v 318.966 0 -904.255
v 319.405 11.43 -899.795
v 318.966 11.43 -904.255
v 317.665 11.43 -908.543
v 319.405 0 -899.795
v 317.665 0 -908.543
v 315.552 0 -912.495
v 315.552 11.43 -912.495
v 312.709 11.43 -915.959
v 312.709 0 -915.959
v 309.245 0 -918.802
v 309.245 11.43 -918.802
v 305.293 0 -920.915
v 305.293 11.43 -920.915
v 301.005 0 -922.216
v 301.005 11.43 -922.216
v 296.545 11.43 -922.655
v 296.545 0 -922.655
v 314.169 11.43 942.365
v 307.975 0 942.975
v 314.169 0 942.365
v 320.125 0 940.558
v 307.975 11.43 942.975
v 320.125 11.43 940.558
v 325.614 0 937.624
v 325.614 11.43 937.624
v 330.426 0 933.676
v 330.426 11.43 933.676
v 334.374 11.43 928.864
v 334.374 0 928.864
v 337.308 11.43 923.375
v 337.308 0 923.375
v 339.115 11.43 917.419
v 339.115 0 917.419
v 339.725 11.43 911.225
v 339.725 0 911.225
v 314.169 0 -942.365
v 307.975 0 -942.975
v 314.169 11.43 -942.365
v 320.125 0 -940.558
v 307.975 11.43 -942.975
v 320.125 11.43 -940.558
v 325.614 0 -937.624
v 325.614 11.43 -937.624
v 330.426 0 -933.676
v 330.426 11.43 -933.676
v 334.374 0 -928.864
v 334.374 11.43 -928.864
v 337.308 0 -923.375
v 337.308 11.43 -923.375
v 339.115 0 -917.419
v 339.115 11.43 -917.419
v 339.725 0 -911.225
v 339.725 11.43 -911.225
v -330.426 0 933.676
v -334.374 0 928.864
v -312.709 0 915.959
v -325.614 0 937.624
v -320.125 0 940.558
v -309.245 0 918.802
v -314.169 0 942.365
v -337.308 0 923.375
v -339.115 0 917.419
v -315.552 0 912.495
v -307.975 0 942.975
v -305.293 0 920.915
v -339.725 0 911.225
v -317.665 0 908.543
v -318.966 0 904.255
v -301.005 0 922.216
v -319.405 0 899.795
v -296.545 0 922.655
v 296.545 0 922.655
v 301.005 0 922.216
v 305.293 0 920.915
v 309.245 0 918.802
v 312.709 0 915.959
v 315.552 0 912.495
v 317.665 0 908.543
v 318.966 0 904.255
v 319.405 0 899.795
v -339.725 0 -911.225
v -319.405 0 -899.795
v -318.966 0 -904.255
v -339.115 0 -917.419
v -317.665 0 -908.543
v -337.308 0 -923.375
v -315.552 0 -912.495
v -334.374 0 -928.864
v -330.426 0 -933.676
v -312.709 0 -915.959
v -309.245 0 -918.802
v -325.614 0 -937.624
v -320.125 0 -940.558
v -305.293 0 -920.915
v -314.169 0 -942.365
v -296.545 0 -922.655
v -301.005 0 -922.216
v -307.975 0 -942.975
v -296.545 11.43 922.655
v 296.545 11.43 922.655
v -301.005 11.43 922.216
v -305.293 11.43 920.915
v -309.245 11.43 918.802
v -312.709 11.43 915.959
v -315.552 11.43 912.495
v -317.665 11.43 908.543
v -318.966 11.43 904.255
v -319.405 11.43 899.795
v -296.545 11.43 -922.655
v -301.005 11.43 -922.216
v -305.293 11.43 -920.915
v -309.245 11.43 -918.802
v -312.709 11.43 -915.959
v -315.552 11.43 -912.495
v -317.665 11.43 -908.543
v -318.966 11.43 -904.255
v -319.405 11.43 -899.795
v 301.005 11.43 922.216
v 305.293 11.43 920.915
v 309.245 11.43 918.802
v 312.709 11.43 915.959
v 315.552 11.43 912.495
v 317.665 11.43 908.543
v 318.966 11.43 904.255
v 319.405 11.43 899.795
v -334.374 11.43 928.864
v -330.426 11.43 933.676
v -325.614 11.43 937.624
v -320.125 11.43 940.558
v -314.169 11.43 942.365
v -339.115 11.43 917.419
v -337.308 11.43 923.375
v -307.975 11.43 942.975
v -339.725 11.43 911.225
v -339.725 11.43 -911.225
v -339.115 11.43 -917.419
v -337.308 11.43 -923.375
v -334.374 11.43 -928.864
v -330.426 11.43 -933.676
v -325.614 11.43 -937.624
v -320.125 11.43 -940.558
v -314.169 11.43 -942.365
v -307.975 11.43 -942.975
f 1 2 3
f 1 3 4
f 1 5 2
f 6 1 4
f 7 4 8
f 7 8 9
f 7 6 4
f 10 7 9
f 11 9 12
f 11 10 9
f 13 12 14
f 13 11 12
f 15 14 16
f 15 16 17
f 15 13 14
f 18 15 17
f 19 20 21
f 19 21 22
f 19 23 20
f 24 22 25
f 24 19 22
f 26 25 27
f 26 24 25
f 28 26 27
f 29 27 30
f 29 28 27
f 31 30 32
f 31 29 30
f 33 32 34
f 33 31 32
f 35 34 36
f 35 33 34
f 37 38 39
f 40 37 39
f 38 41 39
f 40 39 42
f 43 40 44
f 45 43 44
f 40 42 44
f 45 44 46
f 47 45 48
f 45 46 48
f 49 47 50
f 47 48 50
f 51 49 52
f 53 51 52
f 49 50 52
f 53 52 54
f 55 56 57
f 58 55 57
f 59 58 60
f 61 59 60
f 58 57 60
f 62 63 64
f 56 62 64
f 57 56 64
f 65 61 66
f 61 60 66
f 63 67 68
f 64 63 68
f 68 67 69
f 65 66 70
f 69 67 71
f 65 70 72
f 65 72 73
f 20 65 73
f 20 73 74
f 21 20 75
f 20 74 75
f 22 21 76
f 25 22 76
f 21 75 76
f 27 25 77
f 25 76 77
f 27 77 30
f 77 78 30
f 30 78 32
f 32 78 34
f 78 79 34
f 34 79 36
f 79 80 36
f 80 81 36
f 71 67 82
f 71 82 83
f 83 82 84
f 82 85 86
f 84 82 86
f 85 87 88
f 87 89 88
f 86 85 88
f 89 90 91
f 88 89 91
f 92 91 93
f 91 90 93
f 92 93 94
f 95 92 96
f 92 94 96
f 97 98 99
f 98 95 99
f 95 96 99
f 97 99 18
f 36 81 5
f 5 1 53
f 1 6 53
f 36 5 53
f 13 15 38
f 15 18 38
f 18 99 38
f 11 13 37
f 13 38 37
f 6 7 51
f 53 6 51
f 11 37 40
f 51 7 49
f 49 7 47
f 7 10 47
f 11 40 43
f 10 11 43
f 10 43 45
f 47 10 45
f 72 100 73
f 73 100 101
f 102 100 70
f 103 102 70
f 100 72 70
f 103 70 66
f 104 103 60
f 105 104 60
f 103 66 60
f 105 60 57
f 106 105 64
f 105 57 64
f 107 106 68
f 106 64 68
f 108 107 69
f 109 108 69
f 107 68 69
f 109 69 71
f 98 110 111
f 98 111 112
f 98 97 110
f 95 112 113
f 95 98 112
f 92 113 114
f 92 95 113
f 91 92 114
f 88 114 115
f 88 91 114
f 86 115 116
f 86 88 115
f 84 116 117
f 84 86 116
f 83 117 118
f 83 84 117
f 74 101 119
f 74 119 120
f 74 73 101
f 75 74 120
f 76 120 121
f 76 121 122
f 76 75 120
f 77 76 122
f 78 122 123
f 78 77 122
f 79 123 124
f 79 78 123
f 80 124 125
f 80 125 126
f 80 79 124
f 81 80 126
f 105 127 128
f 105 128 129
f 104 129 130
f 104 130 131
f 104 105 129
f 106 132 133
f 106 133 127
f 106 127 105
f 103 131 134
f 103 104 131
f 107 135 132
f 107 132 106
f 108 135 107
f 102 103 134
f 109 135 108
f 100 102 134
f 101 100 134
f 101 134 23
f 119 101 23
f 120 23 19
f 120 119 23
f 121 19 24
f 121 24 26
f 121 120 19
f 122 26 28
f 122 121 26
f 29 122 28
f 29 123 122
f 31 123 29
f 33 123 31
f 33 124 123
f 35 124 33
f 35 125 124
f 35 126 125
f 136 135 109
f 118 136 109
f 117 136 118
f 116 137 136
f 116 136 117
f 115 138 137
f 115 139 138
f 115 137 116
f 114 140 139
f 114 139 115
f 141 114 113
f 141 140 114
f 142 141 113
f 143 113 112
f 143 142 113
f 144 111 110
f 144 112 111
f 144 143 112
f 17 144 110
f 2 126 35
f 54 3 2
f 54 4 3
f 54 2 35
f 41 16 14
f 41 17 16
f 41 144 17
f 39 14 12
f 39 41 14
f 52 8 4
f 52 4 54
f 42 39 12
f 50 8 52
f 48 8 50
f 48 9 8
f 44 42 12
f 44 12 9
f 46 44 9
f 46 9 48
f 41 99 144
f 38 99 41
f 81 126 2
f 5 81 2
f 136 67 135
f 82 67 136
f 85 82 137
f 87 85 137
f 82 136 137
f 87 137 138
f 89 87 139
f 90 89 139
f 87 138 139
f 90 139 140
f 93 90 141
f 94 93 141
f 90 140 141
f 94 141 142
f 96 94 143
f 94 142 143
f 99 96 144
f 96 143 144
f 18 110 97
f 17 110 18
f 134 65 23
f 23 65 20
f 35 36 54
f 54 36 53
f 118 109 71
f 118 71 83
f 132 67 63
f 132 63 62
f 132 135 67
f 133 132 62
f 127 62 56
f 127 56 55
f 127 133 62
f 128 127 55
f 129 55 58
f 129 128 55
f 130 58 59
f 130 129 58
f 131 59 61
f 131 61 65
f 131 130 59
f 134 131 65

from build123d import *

# Parameters (mm, degrees)
SKETCH1_W           = 679.45
SKETCH1_H           = 1885.95
BOSS_EXTRUDE1_DEPTH = 11.43
SKETCH3_W           = 638.81
SKETCH3_H           = 1845.31
CUT_EXTRUDE2_DEPTH  = 1003.369977179
FILLET1_R           = 31.75
FILLET2_R           = 22.86


with BuildPart() as part:
    # Sketch1 → Boss-Extrude1 (new body)
    with BuildSketch(Plane(origin=(0, 0, 0), x_dir=(1, 0, 0), z_dir=(0, 1, 0))):
        Rectangle(SKETCH1_W, SKETCH1_H)
    extrude(amount=BOSS_EXTRUDE1_DEPTH)

    # Sketch3 → Cut-Extrude2 (cut, through all)
    with BuildSketch(Plane(origin=(0, 11.43, 0), x_dir=(1, 0, 0), z_dir=(0, 1, 0))):
        Rectangle(SKETCH3_W, SKETCH3_H)
    extrude(amount=-CUT_EXTRUDE2_DEPTH, mode=Mode.SUBTRACT)

    # Fillet1
    fillet1_edges = [part.edges().sort_by_distance(p)[0] for p in [
        (-339.725, 5.715, -942.975),
        (339.725, 5.715, -942.975),
        (339.725, 5.715, 942.975),
        (-339.725, 5.715, 942.975),
    ]]
    fillet(fillet1_edges, radius=FILLET1_R)

    # Fillet2
    fillet2_edges = [part.edges().sort_by_distance(p)[0] for p in [
        (-319.405, 5.715, -922.655),
        (319.405, 5.715, -922.655),
        (319.405, 5.715, 922.655),
        (-319.405, 5.715, 922.655),
    ]]
    fillet(fillet2_edges, radius=FILLET2_R)


solid = part.part
